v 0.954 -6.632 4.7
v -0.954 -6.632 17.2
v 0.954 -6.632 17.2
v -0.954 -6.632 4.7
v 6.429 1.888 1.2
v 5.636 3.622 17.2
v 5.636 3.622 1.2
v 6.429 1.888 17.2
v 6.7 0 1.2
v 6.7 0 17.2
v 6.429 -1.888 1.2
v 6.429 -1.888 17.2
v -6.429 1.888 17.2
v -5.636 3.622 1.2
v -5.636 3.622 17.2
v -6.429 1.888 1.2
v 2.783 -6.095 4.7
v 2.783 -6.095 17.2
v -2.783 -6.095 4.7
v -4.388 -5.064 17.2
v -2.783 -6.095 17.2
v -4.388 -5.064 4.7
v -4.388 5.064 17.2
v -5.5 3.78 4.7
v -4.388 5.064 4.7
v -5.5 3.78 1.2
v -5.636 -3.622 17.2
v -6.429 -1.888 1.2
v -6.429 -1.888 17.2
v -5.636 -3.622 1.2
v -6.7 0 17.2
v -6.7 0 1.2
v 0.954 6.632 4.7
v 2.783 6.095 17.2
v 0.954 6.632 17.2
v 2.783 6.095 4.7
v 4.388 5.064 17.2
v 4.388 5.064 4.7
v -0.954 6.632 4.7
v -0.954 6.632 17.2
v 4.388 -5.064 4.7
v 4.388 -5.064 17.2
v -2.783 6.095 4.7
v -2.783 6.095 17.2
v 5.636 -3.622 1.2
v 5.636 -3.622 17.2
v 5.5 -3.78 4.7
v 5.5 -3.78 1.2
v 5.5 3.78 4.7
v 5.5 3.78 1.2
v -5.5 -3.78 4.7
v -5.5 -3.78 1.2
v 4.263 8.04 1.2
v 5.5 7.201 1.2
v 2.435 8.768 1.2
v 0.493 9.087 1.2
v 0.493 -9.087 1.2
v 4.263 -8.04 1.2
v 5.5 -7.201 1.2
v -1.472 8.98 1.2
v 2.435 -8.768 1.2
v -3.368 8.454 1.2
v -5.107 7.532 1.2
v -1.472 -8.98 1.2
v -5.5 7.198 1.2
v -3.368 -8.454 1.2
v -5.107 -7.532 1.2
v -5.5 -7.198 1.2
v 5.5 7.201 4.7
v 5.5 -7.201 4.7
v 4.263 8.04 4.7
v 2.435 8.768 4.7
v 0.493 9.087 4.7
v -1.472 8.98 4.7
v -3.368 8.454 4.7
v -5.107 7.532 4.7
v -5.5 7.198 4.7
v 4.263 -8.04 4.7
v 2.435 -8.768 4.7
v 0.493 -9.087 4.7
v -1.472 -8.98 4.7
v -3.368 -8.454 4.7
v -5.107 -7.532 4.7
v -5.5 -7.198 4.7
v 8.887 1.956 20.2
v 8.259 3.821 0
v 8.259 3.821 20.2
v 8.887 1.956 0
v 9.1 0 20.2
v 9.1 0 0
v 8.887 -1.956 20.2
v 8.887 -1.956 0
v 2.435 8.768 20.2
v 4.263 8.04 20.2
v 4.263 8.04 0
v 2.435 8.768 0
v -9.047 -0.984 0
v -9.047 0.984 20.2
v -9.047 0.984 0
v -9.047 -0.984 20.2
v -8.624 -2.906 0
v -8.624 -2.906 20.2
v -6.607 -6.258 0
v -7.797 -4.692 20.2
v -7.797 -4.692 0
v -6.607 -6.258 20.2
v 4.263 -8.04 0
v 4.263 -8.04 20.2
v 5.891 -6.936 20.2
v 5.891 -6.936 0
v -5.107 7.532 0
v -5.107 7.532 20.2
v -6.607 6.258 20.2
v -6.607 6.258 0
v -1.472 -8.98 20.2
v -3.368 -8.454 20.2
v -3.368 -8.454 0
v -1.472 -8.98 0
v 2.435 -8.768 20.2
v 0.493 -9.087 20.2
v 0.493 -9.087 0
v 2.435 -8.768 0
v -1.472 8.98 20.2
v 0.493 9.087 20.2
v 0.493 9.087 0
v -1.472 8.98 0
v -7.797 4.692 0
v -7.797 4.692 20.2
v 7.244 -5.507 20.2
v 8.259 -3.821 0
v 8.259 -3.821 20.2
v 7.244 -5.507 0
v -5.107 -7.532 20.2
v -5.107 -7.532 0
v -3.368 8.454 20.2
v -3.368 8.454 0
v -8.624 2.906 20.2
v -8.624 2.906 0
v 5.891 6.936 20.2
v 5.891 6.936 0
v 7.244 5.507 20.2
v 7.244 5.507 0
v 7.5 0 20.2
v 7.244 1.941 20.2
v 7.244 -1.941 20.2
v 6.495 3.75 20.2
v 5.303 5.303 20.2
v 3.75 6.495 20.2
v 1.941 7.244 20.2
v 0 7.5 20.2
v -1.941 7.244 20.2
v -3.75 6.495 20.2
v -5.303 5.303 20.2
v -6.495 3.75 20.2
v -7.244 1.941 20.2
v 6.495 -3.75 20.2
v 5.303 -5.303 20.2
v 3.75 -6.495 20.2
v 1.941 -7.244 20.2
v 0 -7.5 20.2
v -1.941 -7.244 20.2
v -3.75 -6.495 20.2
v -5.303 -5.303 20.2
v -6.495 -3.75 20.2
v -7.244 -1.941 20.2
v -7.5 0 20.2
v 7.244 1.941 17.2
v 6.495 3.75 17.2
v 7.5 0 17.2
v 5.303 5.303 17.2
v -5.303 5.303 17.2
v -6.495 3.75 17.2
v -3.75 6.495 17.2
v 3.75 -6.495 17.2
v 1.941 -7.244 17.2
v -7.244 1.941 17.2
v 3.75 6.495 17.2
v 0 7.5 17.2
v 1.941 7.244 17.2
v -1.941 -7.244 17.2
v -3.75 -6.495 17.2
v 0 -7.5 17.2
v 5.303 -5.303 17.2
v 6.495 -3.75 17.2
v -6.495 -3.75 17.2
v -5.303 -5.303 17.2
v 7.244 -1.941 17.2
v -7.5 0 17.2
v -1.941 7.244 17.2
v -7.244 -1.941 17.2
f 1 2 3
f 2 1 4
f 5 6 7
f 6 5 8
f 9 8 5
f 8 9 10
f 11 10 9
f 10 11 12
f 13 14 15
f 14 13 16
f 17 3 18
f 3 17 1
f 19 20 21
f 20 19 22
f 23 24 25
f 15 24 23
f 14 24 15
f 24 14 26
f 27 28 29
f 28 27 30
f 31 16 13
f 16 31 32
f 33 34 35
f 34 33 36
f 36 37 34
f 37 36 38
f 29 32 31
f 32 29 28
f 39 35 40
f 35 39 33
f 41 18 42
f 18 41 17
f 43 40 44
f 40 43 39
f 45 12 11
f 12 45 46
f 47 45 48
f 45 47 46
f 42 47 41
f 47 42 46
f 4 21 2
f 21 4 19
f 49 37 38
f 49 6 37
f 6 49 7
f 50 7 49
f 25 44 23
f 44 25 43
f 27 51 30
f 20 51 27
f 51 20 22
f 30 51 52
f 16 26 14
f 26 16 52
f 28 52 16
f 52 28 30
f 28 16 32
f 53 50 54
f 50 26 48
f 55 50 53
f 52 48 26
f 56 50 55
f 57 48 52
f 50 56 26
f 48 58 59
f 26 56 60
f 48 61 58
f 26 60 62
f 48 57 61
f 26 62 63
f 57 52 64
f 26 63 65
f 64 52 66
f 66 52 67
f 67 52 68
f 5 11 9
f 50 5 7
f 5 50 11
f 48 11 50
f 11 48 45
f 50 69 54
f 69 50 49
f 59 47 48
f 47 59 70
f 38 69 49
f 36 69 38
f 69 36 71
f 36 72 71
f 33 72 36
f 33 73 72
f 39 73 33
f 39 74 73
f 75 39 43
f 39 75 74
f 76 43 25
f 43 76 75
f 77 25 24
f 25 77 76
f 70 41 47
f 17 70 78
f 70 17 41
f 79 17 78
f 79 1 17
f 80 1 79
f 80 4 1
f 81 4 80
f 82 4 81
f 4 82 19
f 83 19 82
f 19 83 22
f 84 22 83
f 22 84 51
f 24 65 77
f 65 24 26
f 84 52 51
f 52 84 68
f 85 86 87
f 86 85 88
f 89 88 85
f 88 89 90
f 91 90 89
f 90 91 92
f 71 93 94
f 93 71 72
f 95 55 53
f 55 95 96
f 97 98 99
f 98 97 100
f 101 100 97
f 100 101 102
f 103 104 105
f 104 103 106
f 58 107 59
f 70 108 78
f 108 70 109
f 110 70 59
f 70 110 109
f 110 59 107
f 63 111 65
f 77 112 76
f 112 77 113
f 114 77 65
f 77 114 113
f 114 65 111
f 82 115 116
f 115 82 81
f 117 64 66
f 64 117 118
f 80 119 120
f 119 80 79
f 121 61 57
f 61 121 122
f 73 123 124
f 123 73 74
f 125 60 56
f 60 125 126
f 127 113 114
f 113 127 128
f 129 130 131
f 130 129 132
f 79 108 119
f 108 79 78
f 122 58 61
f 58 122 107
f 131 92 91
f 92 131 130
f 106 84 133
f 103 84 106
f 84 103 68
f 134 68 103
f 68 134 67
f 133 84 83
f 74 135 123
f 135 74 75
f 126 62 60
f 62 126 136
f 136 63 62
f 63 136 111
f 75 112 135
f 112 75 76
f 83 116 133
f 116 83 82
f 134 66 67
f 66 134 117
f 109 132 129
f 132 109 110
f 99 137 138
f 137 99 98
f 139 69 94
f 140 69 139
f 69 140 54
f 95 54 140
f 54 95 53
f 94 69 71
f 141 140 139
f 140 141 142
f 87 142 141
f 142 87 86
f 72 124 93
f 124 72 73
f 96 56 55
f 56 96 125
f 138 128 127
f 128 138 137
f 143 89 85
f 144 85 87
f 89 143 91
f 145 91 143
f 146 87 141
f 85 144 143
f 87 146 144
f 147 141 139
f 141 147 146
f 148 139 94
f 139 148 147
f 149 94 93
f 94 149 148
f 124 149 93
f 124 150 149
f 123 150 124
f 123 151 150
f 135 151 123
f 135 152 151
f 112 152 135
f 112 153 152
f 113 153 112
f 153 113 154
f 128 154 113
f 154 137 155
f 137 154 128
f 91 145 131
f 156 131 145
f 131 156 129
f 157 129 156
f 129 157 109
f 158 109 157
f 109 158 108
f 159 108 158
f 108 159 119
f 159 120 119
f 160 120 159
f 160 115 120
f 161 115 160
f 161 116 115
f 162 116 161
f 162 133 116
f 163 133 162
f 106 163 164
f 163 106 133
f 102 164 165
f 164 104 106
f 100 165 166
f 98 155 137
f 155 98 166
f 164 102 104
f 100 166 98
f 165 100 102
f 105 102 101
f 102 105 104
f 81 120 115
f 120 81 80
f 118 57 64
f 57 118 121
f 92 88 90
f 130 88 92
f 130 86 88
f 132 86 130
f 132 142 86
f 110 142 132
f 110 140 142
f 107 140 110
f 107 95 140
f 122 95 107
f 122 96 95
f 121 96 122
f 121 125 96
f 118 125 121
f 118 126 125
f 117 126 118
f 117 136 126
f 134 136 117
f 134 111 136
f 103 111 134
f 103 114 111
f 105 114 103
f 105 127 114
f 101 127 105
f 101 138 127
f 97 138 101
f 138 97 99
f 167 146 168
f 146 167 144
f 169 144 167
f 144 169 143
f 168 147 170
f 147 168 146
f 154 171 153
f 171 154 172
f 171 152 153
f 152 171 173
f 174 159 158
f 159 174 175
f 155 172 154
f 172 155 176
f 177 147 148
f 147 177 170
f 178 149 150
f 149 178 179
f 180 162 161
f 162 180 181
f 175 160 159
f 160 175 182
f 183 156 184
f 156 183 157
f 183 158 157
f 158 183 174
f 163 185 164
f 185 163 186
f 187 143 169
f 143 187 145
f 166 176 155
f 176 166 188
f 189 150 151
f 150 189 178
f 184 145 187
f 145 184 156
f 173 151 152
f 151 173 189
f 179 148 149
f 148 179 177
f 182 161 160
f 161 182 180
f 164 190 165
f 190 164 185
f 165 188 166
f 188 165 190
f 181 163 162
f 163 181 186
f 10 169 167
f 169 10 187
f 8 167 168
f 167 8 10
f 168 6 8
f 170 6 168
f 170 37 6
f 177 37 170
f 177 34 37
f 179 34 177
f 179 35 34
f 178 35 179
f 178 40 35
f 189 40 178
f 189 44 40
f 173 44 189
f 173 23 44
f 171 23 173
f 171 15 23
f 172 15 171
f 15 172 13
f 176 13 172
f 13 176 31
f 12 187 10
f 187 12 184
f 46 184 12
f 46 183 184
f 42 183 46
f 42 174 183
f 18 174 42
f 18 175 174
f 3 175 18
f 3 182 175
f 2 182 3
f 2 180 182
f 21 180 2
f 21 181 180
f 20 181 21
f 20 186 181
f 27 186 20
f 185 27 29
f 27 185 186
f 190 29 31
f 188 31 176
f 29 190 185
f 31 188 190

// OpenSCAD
wall_w = 1.6;

spot_d = 15.0;
spot_r = spot_d / 2;
spot_td = spot_d + (wall_w * 2);
spot_id = 13.4;
spot_ir = spot_id / 2;
spot_tr = spot_td / 2;
spot_bh = 1.2;
spot_ih = 19.0;
spot_th = spot_bh + spot_ih;
gap_h = 3.5;
gap_ih = 3.5;
gap_iw = 6.0;
gap_w = 11.0;

difference() {
  cylinder(r = spot_tr, h = spot_th);
  translate([0,0,spot_bh]) {
    cylinder(r=spot_ir, h=spot_th);
    translate([0,0,gap_ih/2]) {
      cube([gap_w,spot_td+1,gap_ih], center=true);
    }
    translate([0,0,gap_h/2]) {
      cube([gap_iw,spot_td+1,gap_h], center=true);
    }
  }
  translate([0,0,(spot_th-3)]) {
    cylinder(r = spot_r, h = spot_th);
  }
}
